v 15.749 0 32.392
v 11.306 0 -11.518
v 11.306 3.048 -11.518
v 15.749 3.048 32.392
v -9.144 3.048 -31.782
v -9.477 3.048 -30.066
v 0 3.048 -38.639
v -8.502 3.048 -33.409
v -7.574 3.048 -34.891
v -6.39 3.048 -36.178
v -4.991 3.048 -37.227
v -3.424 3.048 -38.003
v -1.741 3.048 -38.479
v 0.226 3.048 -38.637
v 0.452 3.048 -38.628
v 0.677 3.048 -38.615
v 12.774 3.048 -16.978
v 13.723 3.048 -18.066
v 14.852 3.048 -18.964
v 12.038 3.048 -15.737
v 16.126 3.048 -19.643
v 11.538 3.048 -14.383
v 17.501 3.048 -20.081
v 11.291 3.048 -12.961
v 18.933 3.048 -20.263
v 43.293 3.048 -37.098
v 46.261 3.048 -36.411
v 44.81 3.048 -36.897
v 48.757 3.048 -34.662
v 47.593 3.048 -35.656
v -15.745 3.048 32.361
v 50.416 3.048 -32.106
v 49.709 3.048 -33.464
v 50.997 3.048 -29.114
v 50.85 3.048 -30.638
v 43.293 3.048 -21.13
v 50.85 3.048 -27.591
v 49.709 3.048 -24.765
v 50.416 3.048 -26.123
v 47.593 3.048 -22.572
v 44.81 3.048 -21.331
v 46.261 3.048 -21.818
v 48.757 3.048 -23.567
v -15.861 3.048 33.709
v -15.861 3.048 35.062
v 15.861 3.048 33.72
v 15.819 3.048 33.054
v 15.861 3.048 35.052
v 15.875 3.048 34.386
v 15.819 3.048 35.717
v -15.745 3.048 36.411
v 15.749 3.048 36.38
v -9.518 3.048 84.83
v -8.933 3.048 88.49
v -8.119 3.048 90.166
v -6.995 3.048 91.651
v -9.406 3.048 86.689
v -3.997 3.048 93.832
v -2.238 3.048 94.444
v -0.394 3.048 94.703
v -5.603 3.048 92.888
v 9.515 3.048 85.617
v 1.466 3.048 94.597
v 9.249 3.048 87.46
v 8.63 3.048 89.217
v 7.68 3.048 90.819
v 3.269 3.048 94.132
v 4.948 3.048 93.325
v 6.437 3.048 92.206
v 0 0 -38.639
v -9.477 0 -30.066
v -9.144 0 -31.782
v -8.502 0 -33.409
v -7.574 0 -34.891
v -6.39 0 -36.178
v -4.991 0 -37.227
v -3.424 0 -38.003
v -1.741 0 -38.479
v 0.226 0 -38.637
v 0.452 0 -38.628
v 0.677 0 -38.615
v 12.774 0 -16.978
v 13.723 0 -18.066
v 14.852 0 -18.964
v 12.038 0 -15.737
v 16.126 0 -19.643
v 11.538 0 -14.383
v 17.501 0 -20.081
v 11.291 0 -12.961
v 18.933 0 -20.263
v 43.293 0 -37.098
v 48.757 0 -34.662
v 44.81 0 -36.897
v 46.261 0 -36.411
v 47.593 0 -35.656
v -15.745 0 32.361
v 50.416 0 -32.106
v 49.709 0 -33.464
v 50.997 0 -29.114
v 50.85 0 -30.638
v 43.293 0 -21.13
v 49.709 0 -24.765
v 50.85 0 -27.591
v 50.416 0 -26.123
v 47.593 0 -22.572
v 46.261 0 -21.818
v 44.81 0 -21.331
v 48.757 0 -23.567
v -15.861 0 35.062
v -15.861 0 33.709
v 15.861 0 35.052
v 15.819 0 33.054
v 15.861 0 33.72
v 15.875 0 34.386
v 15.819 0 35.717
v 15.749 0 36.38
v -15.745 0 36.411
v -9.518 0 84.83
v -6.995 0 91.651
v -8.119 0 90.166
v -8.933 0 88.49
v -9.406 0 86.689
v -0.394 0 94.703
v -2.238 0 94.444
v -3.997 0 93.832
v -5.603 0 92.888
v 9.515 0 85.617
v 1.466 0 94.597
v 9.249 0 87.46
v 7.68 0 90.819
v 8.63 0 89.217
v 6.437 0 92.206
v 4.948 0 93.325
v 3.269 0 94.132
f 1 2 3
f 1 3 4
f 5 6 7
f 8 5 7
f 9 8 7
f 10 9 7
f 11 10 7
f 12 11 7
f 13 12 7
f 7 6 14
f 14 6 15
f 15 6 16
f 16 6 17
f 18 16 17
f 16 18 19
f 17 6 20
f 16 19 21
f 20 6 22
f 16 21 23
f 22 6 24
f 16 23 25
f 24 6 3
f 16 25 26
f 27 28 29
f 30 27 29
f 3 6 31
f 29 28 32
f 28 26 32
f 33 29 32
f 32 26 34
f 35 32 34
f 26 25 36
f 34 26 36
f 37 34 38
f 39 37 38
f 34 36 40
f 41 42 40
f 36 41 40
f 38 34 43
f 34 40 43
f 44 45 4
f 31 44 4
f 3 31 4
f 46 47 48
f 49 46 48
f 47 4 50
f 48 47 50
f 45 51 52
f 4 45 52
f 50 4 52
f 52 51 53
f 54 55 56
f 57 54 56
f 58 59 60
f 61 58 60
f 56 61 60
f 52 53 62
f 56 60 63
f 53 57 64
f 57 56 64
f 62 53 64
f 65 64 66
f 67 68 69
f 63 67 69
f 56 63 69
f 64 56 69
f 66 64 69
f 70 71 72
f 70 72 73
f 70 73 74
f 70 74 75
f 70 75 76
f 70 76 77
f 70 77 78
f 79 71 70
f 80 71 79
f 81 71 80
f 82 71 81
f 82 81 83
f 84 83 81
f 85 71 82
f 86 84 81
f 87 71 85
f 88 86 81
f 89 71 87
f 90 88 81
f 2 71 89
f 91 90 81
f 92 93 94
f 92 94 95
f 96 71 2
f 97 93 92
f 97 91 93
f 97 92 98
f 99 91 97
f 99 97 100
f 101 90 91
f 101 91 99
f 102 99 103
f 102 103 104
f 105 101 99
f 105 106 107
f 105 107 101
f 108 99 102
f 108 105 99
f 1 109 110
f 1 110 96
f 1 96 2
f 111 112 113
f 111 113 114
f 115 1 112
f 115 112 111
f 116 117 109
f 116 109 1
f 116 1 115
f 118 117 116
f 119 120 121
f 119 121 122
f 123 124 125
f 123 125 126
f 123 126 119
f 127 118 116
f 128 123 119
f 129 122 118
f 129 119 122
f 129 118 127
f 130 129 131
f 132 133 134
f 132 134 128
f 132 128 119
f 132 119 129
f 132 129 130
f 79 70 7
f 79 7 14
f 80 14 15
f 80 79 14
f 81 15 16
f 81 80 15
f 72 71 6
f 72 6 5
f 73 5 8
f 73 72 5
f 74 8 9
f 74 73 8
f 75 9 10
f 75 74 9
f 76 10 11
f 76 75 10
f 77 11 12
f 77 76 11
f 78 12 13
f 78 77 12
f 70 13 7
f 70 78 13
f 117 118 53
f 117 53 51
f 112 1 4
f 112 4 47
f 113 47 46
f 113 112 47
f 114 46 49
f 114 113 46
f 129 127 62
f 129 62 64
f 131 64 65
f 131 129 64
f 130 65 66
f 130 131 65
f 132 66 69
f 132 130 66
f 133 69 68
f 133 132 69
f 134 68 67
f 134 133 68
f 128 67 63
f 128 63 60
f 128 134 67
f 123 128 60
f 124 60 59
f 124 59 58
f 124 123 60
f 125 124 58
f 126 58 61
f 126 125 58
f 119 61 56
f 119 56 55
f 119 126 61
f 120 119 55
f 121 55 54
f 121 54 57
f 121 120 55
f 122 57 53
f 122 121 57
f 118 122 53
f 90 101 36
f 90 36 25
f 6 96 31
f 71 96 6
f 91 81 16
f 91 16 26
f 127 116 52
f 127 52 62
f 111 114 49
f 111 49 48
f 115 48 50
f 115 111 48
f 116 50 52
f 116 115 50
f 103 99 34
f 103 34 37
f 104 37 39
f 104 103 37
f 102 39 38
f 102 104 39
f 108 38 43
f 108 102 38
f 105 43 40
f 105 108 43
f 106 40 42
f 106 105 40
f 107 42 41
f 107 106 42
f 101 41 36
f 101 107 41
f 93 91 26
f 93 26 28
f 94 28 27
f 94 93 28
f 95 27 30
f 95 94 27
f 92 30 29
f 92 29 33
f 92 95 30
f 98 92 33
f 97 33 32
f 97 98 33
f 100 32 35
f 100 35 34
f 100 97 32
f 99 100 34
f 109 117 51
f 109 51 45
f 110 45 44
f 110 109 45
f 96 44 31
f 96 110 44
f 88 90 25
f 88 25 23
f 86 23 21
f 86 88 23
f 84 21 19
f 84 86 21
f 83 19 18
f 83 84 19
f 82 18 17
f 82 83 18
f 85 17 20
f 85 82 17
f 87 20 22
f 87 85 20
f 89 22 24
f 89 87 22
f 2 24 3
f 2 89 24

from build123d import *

# Parameters (mm, degrees)
F0_R     = 3.4358661268
F0_R_2   = 3.175
F1_DEPTH = 3.048


with BuildPart() as f1:
    # F0 (on Front) → F1 (new body)
    with BuildSketch(Plane.XZ):
        with BuildLine():
            ThreePointArc((-9.5183396769, 84.8296558798), (0.1781005018, 75.6624598361), (9.525, 85.1857946098))
            ThreePointArc((9.525, 85.1857946098), (9.5225589236, 85.4014251892), (9.5152369456, 85.6169452446))
            ThreePointArc((9.5152369456, 85.6169452446), (-0.3936477394, 94.7026568268), (-9.5183396769, 84.8296558798))
        make_face()
        with Locations((0, 85.1857946098)):
            Circle(F0_R, mode=Mode.SUBTRACT)
        with BuildLine():
            ThreePointArc((50.9971381625, -29.1142053902), (48.756887413, -23.5666769907), (43.2925762854, -21.1304711977))
            ThreePointArc((43.2925762854, -21.1304711977), (35.0195540586, -29.1142053902), (43.2925762854, -37.0979395828))
            ThreePointArc((43.2925762854, -37.0979395828), (48.756887413, -34.6617337898), (50.9971381625, -29.1142053902))
        make_face()
        with Locations((43.0083461106, -29.1142053902)):
            Circle(F0_R_2, mode=Mode.SUBTRACT)
        with BuildLine():
            ThreePointArc((9.5152369456, 85.6169452446), (9.5225589236, 85.4014251892), (9.525, 85.1857946098))
            ThreePointArc((9.525, 85.1857946098), (0.1781005018, 75.6624598361), (-9.5183396769, 84.8296558798))
            Line((-9.5183396769, 84.8296558798), (-15.7453232111, 36.4107444804))
            ThreePointArc((-15.7453232111, 36.4107444804), (0.0155737272, 50.2607869707), (15.7492659439, 36.3798475748))
            Line((15.7492659439, 36.3798475748), (9.5152369456, 85.6169452446))
        make_face()
        with Locations((-4.955154378, 70.9109946098)):
            Circle(F0_R_2, mode=Mode.SUBTRACT)
        with BuildLine():
            ThreePointArc((9.525, -29.1142053902), (-0.4763850058, -19.6011258506), (-9.477347995, -30.0657830179))
            ThreePointArc((-9.477347995, -30.0657830179), (-6.3899079843, -36.1778235107), (0, -38.6392053902))
            Line((0, -38.6392053902), (0.6773435479, -38.6150911762))
            ThreePointArc((0.6773435479, -38.6150911762), (6.9705567315, -35.6055044785), (9.525, -29.1142053902))
        make_face()
        with Locations((0, -29.1142053902)):
            Circle(F0_R_2, mode=Mode.SUBTRACT)
        with BuildLine():
            ThreePointArc((15.7492659439, 32.3917416448), (0.0155737272, 18.5108022489), (-15.7453232111, 32.3608447391))
            Line((-15.7453232111, 32.3608447391), (-9.477347995, -30.0657830179))
            ThreePointArc((-9.477347995, -30.0657830179), (-0.4763850058, -19.6011258506), (9.525, -29.1142053902))
            ThreePointArc((9.525, -29.1142053902), (6.9705567315, -35.6055044785), (0.6773435479, -38.6150911762))
            Line((0.6773435479, -38.6150911762), (43.2925762854, -37.0979395828))
            ThreePointArc((43.2925762854, -37.0979395828), (35.0195540586, -29.1142053902), (43.2925762854, -21.1304711977))
            Line((43.2925762854, -21.1304711977), (18.9326805356, -20.2632307233))
            ThreePointArc((18.9326805356, -20.2632307233), (13.2237613326, -17.5434154773), (11.3057365986, -11.5176097586))
            Line((11.3057365986, -11.5176097586), (15.7492659439, 32.3917416448))
        make_face()
        with BuildLine():
            ThreePointArc((15.875, 34.3857946098), (15.843535304, 35.3848011513), (15.7492659439, 36.3798475748))
            ThreePointArc((15.7492659439, 36.3798475748), (0.0155737272, 50.2607869707), (-15.7453232111, 36.4107444804))
            ThreePointArc((-15.7453232111, 36.4107444804), (-15.875, 34.3857946098), (-15.7453232111, 32.3608447391))
            ThreePointArc((-15.7453232111, 32.3608447391), (0.0155737272, 18.5108022489), (15.7492659439, 32.3917416448))
            ThreePointArc((15.7492659439, 32.3917416448), (15.843535304, 33.3867880682), (15.875, 34.3857946098))
        make_face()
        with Locations((0, 34.3857946098)):
            Circle(F0_R_2, mode=Mode.SUBTRACT)
        with Locations((-4.955154378, 70.9109946098)):
            Circle(F0_R_2)
        with Locations((0, -29.1142053902)):
            Circle(F0_R_2)
        with Locations((43.0083461106, -29.1142053902)):
            Circle(F0_R_2)
        with BuildLine():
            Line((0.6773435479, -38.6150911762), (0, -38.6392053902))
            ThreePointArc((0, -38.6392053902), (0.3388863295, -38.6331749277), (0.6773435479, -38.6150911762))
        make_face()
        with Locations((0, 85.1857946098)):
            Circle(F0_R)
        with Locations((0, 34.3857946098)):
            Circle(F0_R_2)
    extrude(amount=-F1_DEPTH)


solid = f1.part
